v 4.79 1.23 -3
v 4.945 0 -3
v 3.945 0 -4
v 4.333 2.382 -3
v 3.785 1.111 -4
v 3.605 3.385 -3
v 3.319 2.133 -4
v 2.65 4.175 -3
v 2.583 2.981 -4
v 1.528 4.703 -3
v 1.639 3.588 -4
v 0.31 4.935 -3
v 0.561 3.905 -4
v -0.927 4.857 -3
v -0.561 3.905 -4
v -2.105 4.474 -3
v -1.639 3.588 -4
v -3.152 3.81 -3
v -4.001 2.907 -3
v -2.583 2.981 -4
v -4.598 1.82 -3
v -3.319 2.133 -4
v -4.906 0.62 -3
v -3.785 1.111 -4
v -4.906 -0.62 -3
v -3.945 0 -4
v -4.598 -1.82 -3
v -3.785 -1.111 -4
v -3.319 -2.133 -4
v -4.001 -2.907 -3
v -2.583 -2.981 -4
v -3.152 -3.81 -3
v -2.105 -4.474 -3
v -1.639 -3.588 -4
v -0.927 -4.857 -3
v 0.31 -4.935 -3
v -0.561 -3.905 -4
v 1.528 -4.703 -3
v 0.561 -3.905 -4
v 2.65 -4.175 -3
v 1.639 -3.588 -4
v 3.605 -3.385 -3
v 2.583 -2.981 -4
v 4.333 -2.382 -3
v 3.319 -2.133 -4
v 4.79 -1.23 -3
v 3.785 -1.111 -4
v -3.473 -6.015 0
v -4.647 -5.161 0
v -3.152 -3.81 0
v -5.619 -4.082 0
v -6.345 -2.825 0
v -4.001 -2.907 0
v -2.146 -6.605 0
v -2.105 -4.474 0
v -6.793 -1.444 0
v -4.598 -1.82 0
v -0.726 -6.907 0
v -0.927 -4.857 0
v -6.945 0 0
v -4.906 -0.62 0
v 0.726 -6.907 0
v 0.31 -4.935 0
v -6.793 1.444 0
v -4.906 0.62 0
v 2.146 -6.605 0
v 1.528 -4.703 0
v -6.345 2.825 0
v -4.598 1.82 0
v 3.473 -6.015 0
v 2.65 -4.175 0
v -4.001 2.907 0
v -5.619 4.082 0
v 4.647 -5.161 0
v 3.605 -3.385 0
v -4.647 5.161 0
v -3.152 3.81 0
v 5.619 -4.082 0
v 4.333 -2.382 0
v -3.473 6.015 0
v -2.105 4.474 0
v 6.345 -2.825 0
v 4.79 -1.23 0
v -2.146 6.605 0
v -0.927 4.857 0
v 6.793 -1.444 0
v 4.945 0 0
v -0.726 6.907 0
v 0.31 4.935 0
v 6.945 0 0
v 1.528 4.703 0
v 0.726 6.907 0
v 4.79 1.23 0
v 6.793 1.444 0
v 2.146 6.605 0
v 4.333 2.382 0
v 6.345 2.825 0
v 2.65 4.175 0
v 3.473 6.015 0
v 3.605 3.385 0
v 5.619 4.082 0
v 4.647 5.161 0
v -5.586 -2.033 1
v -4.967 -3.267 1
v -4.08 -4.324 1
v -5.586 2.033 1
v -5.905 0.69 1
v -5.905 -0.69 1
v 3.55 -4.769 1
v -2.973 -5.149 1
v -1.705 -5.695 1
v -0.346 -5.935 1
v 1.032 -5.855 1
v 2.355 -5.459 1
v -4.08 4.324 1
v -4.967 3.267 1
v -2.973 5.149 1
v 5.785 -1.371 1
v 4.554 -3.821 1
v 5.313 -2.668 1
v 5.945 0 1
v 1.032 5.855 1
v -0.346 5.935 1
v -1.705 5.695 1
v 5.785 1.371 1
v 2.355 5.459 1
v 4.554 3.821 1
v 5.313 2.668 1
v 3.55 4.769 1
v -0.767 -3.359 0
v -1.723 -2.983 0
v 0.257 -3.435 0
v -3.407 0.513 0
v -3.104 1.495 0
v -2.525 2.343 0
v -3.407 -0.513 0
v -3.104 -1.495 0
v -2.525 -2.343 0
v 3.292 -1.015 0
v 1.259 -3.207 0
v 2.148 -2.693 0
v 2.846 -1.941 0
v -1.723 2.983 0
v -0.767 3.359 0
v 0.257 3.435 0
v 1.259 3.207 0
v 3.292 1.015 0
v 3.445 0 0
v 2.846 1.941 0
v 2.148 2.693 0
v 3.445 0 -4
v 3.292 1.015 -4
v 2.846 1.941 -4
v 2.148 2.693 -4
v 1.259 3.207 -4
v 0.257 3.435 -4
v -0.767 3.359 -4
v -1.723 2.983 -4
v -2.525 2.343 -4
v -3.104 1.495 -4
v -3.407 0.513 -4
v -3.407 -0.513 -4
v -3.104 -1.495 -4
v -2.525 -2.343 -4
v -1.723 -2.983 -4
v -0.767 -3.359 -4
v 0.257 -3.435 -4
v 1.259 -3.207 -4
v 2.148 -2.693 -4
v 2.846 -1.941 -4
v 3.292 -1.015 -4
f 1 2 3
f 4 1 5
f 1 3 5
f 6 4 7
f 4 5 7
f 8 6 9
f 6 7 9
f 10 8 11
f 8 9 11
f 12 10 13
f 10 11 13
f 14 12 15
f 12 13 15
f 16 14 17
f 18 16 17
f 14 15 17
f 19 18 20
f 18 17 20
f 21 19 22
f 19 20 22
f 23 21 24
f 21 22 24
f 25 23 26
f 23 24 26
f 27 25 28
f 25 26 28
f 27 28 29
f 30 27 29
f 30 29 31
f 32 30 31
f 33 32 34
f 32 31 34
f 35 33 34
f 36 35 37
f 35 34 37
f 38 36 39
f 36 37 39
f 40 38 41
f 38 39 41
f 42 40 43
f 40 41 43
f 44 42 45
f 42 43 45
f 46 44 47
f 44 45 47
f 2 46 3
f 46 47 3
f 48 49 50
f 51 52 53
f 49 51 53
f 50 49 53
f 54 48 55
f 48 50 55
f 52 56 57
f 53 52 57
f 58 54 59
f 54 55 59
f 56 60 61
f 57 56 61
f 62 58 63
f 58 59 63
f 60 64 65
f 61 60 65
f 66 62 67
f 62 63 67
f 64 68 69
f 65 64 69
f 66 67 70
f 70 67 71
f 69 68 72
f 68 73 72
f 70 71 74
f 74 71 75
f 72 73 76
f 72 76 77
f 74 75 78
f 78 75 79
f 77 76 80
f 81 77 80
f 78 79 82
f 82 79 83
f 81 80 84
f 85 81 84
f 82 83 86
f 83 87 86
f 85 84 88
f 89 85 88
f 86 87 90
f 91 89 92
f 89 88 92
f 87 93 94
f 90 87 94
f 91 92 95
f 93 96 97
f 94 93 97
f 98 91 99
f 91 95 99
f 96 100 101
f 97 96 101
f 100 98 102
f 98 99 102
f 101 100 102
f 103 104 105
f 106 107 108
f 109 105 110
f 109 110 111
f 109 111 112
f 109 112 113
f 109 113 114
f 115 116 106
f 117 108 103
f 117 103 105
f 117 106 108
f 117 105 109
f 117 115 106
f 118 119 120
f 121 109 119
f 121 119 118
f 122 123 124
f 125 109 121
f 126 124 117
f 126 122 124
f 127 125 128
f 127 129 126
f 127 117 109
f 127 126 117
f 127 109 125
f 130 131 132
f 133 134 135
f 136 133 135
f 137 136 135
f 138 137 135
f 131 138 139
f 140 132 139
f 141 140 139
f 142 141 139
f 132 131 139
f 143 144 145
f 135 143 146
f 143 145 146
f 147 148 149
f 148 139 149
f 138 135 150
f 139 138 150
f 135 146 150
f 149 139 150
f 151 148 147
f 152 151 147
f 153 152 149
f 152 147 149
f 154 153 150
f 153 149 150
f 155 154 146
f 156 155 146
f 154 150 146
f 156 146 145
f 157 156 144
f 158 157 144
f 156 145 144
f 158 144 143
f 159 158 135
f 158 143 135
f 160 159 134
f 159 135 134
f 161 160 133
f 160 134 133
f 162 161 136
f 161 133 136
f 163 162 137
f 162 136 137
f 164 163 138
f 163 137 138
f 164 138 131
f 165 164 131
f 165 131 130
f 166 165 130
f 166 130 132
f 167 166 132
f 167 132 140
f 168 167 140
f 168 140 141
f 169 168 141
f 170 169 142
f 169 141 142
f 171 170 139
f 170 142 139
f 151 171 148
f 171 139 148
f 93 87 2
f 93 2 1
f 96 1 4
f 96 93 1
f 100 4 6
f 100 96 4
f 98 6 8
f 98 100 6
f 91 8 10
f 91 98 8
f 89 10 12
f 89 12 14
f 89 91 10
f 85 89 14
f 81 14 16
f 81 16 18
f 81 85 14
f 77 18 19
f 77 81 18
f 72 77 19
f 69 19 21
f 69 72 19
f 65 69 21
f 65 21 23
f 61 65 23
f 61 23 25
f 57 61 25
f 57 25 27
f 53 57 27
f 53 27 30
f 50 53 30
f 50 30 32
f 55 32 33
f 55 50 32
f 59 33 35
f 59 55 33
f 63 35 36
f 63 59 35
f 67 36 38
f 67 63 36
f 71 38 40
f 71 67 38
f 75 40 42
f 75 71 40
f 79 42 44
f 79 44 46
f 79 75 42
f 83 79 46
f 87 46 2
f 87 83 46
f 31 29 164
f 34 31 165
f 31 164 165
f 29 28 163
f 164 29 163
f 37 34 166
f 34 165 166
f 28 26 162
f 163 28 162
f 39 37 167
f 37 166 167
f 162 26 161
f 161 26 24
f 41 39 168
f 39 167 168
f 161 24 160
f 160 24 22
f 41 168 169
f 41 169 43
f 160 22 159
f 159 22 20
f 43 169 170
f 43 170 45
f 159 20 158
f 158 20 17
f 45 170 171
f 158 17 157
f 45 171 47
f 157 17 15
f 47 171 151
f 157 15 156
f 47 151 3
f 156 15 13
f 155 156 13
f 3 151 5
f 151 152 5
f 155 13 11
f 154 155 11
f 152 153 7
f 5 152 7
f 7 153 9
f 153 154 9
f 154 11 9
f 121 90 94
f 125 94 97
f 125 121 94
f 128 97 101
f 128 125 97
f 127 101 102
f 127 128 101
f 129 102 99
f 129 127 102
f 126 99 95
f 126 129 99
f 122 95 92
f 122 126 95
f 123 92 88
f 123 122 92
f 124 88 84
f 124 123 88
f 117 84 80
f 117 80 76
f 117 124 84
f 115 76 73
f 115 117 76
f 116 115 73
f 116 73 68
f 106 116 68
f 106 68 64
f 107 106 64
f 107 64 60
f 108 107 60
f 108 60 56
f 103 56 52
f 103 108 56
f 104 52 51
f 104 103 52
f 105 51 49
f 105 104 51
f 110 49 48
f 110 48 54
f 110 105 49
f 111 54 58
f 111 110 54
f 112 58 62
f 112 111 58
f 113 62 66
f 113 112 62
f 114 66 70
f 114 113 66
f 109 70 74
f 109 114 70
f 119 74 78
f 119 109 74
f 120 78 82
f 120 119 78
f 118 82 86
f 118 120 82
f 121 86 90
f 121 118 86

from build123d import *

# Parameters (mm, degrees)
F0_R        = 4.945
F0_R_2      = 3.445
F1_DEPTH    = 4
F0_R_3      = 6.945
F1_FACE_R   = 4.945
F1_FACE_R_2 = 3.445
F2_DEPTH    = 1
F3_SIZE     = 0.99999
F4_SIZE2    = 1
F4_SIZE     = 1


# Not quite as in the source:
# - a fillet or chamfer is up to 0.001 mm smaller than in the source, because OpenCascade refuses the exact size


with BuildPart() as f1:
    # F0 (on Top) → F1 (new body)
    with BuildSketch(Plane.XY):
        Circle(F0_R)
        Circle(F0_R_2, mode=Mode.SUBTRACT)
    extrude(amount=-F1_DEPTH)

    # F0 (on Top) + F1_face (on face) → F2 (join)
    with BuildSketch(Plane.XY):
        Circle(F0_R_3)
        Circle(F0_R, mode=Mode.SUBTRACT)
        Circle(F0_R_2)
    with BuildSketch(Plane.XY):
        Circle(F1_FACE_R)
        Circle(F1_FACE_R_2, mode=Mode.SUBTRACT)
    extrude(amount=F2_DEPTH)

    # F3 (size 1 in the source; OpenCascade refuses exactly that, so slightly less here)
    f3_edges = [f1.edges().sort_by_distance(p)[0] for p in [
        (-6.945, 0, 1),
    ]]
    chamfer(f3_edges, length=F3_SIZE)

    # F4
    f4_edges = [f1.edges().sort_by_distance(p)[0] for p in [
        (-4.945, 0, -4),
    ]]
    chamfer(f4_edges, length=F4_SIZE, length2=F4_SIZE2)


solid = f1.part
